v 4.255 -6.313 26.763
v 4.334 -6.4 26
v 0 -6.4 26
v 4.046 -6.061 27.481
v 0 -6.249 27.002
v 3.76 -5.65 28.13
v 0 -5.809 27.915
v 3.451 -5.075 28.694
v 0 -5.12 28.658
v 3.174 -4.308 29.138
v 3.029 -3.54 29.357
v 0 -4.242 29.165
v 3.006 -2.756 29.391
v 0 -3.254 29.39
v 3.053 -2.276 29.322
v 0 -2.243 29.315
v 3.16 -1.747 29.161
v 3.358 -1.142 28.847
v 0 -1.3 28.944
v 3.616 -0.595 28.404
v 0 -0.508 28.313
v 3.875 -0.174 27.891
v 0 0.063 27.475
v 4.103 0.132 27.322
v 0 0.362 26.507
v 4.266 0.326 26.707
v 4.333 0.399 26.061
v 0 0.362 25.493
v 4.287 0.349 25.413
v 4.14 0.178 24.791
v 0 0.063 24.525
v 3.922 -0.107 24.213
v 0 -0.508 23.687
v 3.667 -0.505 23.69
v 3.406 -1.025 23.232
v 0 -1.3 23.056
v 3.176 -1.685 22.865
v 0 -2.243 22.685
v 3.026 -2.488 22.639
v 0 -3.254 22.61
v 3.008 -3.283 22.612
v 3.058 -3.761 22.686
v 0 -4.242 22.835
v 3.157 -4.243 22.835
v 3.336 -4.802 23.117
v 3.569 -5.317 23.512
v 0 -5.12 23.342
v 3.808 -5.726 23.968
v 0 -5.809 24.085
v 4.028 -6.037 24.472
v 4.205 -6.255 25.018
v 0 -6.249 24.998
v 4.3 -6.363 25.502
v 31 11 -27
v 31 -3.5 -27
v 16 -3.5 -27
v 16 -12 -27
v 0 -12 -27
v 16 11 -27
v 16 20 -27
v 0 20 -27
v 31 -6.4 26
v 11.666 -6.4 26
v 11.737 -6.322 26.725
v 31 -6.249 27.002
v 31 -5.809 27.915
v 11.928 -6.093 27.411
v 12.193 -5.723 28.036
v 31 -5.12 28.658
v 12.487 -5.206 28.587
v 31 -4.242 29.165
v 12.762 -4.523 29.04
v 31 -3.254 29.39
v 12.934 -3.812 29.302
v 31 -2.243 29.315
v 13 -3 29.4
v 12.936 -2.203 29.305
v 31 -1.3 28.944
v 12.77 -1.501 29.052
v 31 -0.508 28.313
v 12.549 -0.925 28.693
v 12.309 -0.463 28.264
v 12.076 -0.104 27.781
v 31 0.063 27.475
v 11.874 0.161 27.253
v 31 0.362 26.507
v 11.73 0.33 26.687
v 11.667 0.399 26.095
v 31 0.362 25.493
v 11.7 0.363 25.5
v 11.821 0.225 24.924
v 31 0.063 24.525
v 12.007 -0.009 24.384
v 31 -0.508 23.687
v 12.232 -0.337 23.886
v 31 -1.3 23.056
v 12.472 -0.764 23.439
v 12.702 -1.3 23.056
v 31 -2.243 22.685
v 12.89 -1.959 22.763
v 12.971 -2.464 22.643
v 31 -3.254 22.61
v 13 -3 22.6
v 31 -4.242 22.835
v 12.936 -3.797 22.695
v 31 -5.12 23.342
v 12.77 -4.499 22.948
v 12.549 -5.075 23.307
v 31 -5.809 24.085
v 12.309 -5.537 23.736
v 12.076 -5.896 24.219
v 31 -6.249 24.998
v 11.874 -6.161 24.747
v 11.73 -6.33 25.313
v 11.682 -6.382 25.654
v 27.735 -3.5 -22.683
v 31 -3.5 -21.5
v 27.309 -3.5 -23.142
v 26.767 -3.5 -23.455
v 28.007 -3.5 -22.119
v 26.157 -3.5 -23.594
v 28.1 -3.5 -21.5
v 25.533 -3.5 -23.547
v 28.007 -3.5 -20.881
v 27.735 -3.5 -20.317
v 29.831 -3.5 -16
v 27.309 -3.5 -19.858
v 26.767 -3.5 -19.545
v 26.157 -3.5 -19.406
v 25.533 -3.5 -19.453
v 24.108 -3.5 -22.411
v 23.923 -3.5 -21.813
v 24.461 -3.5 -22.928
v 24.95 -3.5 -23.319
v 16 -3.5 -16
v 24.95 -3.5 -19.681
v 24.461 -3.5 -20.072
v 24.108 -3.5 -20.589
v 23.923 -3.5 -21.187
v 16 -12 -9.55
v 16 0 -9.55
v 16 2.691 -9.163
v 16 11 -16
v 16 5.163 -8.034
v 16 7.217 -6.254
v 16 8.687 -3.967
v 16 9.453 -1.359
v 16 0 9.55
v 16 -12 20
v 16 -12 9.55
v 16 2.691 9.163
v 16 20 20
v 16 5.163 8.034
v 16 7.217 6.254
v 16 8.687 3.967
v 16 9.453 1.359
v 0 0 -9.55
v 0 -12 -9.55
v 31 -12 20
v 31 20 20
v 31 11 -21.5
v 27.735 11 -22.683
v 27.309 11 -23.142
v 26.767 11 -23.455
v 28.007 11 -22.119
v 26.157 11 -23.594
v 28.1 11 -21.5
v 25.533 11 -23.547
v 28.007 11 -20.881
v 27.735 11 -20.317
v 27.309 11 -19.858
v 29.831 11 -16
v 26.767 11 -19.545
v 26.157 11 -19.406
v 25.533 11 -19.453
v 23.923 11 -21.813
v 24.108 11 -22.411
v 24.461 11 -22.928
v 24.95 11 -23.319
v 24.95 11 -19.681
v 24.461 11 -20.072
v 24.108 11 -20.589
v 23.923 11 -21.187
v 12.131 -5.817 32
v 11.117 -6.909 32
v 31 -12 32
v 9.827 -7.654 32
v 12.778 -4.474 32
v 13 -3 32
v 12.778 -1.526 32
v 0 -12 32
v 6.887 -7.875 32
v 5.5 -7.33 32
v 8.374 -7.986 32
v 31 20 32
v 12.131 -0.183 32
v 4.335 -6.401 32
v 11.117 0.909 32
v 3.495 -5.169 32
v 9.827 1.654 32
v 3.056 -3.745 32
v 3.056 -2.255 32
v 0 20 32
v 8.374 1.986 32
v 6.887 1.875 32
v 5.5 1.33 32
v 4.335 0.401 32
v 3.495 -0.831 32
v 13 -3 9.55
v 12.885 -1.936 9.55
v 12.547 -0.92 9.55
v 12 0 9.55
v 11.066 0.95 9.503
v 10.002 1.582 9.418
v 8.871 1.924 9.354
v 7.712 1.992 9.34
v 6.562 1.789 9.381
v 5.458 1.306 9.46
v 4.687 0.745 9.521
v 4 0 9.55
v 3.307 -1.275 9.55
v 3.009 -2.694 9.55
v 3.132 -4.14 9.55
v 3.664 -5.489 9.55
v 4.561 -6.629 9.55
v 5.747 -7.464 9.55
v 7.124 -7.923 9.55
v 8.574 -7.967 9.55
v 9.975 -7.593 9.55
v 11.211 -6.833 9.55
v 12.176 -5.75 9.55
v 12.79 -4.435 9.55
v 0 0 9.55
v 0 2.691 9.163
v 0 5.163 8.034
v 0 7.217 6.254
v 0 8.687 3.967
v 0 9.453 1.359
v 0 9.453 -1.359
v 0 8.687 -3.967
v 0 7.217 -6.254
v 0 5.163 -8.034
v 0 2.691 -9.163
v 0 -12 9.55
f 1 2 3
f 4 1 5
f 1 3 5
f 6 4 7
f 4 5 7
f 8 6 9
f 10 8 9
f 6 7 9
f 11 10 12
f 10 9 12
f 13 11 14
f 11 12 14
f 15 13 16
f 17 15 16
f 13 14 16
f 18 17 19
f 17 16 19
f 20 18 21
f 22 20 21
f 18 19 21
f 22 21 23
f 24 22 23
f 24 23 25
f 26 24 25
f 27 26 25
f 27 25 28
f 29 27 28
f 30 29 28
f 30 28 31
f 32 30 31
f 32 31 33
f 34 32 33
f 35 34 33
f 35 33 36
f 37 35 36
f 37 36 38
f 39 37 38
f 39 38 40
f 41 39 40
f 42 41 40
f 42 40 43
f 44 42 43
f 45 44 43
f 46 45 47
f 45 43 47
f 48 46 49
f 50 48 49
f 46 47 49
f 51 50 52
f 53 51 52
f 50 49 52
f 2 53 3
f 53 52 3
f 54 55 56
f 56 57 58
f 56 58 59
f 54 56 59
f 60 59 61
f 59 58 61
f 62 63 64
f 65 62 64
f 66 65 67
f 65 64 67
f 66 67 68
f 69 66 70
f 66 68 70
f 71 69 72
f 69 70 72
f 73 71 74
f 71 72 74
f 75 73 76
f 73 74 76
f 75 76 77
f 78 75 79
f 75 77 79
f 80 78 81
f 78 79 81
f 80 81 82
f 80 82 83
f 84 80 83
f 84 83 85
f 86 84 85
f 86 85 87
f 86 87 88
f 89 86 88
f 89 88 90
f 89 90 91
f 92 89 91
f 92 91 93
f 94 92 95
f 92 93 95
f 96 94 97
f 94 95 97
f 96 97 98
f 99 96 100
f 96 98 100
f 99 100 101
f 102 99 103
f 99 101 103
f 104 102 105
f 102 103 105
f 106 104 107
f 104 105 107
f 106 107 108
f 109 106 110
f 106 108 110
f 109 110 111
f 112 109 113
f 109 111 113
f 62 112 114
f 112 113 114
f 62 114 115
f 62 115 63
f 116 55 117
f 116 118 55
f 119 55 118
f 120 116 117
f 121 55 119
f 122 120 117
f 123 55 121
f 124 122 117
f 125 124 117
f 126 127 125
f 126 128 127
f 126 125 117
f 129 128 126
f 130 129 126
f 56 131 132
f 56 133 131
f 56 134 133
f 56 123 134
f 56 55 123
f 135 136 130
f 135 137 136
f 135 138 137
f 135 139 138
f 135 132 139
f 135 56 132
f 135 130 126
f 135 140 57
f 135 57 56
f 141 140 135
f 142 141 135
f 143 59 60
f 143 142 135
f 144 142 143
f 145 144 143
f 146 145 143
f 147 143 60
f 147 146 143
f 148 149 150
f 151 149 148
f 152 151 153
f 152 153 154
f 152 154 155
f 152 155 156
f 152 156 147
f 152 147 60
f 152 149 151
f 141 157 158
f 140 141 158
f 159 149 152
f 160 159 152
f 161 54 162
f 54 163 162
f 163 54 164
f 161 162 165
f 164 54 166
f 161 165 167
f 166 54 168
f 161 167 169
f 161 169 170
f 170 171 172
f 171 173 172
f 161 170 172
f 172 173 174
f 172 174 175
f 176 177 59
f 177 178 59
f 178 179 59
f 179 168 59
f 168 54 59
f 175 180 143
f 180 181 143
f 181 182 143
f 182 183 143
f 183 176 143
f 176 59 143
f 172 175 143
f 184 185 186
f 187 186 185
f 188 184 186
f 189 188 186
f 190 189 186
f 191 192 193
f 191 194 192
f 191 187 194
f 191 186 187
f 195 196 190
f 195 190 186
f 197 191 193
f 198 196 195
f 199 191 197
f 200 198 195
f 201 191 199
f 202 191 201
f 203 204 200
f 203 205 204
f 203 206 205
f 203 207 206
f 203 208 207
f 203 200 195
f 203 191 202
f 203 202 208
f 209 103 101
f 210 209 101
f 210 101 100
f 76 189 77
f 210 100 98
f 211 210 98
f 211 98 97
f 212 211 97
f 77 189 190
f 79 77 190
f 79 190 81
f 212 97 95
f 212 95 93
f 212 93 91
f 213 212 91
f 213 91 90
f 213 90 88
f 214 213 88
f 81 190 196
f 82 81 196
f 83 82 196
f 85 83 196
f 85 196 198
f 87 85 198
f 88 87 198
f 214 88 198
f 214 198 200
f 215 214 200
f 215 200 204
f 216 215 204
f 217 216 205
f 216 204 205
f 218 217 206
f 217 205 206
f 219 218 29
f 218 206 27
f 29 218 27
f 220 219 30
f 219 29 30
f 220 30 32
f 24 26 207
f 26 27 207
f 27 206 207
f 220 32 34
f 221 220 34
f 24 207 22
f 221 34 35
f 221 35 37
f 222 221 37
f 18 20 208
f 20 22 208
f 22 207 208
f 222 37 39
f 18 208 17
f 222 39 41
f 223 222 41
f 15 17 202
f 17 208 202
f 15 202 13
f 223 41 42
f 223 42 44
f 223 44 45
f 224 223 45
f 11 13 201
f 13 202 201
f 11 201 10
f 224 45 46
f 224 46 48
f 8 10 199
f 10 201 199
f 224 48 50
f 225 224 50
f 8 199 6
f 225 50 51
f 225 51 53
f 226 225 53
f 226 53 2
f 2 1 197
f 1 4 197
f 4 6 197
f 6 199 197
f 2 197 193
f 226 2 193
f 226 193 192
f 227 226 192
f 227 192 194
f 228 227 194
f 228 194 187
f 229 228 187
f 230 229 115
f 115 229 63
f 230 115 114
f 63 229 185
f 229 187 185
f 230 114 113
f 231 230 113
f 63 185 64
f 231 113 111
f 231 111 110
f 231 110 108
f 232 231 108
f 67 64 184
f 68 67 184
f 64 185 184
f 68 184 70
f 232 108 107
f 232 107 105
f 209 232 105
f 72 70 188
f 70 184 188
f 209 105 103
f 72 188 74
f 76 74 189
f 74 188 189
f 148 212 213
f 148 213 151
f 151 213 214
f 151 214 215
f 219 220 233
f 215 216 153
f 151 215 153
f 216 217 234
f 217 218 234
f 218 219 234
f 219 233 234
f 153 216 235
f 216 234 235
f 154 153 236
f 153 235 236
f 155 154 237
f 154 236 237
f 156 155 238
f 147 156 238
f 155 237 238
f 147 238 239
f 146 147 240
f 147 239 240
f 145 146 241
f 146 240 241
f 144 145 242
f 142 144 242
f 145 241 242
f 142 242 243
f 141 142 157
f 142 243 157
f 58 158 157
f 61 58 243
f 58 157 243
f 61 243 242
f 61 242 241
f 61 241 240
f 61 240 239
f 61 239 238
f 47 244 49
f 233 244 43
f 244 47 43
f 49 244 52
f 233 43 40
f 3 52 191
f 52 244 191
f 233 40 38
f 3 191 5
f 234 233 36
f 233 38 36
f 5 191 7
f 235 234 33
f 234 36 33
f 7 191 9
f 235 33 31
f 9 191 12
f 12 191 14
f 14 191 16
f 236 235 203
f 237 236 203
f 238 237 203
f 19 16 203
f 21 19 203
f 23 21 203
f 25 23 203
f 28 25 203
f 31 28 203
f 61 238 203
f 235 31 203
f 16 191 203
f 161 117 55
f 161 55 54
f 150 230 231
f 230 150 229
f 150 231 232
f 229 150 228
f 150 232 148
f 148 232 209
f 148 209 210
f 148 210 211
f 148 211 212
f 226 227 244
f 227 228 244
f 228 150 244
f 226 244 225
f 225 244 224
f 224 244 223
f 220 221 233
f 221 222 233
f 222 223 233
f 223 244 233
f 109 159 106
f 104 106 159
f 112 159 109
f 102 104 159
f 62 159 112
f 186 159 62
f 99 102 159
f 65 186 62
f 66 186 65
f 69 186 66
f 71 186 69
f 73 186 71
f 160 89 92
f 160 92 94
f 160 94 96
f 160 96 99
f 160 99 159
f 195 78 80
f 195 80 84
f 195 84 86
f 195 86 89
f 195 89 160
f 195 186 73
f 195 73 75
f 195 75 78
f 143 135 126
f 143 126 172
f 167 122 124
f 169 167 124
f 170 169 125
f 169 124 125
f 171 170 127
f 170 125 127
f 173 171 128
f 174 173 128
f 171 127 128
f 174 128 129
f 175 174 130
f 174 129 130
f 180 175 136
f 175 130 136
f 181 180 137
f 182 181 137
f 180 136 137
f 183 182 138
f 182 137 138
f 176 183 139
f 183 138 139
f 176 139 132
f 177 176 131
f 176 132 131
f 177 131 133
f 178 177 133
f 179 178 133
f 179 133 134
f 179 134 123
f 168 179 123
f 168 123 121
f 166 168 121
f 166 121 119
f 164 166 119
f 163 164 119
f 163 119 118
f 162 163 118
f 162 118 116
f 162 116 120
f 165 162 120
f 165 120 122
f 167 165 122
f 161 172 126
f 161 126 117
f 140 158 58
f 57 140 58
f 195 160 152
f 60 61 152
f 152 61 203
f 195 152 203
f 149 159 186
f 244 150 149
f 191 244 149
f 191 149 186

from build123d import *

# Parameters (mm, degrees)
F1_DEPTH  = 16
F2_W      = 14.5
F2_H      = 11
F3_DEPTH  = 15
F5_DEPTH  = 23.501
F7_D      = 4.2
F8_W      = 32
F8_H      = 12
F9_DEPTH  = 15
F10_R     = 5
F11_DEPTH = 25
F13_D     = 6.8


with BuildPart() as f1:
    # F0 (on Right) → F1 (new body)
    with BuildSketch(Plane.YZ):
        with BuildLine():
            ThreePointArc((0, 9.55), (9.55, 0), (0, -9.55))
            Line((0, -9.55), (-12, -9.55))
            Line((-12, -9.55), (-12, -27))
            Line((-12, -27), (20, -27))
            Line((20, -27), (20, 32))
            Line((20, 32), (-12, 32))
            Line((-12, 32), (-12, 9.55))
            Line((-12, 9.55), (0, 9.55))
        make_face()
    extrude(amount=F1_DEPTH)

    # F2 (on face) → F3 (join)
    with BuildSketch(Plane.YZ.offset(16)):
        with Locations((3.75, -21.5)):
            Rectangle(F2_W, F2_H)
    extrude(amount=F3_DEPTH)

    # F4 (on face) → F5 (cut, through all)
    with BuildSketch(Plane.XZ.offset(3.5)):
        Polygon((29.8309389108, -16), (31, -21.5), (31, -16), align=None)
    extrude(amount=-F5_DEPTH, mode=Mode.SUBTRACT)

    # F7 (through all)
    with Locations(Plane(origin=(0, 11, 0), x_dir=(-1, 0, 0), z_dir=(0, 1, 0))):
        with Locations((-26, -21.5)):
            Hole(F7_D / 2)

    # F8 (on face) → F9 (join)
    with BuildSketch(Plane.YZ.offset(16)):
        with Locations((4, 26)):
            Rectangle(F8_W, F8_H)
    extrude(amount=F9_DEPTH)

    # F10 (on face) → F11 (cut)
    with BuildSketch(Plane.XY.offset(32)):
        with Locations((8, -3)):
            Circle(F10_R)
    extrude(amount=-F11_DEPTH, mode=Mode.SUBTRACT)

    # F13 (through all)
    with Locations(Plane.YZ.offset(31)):
        with Locations((-3, 26)):
            Hole(F13_D / 2)


solid = f1.part
